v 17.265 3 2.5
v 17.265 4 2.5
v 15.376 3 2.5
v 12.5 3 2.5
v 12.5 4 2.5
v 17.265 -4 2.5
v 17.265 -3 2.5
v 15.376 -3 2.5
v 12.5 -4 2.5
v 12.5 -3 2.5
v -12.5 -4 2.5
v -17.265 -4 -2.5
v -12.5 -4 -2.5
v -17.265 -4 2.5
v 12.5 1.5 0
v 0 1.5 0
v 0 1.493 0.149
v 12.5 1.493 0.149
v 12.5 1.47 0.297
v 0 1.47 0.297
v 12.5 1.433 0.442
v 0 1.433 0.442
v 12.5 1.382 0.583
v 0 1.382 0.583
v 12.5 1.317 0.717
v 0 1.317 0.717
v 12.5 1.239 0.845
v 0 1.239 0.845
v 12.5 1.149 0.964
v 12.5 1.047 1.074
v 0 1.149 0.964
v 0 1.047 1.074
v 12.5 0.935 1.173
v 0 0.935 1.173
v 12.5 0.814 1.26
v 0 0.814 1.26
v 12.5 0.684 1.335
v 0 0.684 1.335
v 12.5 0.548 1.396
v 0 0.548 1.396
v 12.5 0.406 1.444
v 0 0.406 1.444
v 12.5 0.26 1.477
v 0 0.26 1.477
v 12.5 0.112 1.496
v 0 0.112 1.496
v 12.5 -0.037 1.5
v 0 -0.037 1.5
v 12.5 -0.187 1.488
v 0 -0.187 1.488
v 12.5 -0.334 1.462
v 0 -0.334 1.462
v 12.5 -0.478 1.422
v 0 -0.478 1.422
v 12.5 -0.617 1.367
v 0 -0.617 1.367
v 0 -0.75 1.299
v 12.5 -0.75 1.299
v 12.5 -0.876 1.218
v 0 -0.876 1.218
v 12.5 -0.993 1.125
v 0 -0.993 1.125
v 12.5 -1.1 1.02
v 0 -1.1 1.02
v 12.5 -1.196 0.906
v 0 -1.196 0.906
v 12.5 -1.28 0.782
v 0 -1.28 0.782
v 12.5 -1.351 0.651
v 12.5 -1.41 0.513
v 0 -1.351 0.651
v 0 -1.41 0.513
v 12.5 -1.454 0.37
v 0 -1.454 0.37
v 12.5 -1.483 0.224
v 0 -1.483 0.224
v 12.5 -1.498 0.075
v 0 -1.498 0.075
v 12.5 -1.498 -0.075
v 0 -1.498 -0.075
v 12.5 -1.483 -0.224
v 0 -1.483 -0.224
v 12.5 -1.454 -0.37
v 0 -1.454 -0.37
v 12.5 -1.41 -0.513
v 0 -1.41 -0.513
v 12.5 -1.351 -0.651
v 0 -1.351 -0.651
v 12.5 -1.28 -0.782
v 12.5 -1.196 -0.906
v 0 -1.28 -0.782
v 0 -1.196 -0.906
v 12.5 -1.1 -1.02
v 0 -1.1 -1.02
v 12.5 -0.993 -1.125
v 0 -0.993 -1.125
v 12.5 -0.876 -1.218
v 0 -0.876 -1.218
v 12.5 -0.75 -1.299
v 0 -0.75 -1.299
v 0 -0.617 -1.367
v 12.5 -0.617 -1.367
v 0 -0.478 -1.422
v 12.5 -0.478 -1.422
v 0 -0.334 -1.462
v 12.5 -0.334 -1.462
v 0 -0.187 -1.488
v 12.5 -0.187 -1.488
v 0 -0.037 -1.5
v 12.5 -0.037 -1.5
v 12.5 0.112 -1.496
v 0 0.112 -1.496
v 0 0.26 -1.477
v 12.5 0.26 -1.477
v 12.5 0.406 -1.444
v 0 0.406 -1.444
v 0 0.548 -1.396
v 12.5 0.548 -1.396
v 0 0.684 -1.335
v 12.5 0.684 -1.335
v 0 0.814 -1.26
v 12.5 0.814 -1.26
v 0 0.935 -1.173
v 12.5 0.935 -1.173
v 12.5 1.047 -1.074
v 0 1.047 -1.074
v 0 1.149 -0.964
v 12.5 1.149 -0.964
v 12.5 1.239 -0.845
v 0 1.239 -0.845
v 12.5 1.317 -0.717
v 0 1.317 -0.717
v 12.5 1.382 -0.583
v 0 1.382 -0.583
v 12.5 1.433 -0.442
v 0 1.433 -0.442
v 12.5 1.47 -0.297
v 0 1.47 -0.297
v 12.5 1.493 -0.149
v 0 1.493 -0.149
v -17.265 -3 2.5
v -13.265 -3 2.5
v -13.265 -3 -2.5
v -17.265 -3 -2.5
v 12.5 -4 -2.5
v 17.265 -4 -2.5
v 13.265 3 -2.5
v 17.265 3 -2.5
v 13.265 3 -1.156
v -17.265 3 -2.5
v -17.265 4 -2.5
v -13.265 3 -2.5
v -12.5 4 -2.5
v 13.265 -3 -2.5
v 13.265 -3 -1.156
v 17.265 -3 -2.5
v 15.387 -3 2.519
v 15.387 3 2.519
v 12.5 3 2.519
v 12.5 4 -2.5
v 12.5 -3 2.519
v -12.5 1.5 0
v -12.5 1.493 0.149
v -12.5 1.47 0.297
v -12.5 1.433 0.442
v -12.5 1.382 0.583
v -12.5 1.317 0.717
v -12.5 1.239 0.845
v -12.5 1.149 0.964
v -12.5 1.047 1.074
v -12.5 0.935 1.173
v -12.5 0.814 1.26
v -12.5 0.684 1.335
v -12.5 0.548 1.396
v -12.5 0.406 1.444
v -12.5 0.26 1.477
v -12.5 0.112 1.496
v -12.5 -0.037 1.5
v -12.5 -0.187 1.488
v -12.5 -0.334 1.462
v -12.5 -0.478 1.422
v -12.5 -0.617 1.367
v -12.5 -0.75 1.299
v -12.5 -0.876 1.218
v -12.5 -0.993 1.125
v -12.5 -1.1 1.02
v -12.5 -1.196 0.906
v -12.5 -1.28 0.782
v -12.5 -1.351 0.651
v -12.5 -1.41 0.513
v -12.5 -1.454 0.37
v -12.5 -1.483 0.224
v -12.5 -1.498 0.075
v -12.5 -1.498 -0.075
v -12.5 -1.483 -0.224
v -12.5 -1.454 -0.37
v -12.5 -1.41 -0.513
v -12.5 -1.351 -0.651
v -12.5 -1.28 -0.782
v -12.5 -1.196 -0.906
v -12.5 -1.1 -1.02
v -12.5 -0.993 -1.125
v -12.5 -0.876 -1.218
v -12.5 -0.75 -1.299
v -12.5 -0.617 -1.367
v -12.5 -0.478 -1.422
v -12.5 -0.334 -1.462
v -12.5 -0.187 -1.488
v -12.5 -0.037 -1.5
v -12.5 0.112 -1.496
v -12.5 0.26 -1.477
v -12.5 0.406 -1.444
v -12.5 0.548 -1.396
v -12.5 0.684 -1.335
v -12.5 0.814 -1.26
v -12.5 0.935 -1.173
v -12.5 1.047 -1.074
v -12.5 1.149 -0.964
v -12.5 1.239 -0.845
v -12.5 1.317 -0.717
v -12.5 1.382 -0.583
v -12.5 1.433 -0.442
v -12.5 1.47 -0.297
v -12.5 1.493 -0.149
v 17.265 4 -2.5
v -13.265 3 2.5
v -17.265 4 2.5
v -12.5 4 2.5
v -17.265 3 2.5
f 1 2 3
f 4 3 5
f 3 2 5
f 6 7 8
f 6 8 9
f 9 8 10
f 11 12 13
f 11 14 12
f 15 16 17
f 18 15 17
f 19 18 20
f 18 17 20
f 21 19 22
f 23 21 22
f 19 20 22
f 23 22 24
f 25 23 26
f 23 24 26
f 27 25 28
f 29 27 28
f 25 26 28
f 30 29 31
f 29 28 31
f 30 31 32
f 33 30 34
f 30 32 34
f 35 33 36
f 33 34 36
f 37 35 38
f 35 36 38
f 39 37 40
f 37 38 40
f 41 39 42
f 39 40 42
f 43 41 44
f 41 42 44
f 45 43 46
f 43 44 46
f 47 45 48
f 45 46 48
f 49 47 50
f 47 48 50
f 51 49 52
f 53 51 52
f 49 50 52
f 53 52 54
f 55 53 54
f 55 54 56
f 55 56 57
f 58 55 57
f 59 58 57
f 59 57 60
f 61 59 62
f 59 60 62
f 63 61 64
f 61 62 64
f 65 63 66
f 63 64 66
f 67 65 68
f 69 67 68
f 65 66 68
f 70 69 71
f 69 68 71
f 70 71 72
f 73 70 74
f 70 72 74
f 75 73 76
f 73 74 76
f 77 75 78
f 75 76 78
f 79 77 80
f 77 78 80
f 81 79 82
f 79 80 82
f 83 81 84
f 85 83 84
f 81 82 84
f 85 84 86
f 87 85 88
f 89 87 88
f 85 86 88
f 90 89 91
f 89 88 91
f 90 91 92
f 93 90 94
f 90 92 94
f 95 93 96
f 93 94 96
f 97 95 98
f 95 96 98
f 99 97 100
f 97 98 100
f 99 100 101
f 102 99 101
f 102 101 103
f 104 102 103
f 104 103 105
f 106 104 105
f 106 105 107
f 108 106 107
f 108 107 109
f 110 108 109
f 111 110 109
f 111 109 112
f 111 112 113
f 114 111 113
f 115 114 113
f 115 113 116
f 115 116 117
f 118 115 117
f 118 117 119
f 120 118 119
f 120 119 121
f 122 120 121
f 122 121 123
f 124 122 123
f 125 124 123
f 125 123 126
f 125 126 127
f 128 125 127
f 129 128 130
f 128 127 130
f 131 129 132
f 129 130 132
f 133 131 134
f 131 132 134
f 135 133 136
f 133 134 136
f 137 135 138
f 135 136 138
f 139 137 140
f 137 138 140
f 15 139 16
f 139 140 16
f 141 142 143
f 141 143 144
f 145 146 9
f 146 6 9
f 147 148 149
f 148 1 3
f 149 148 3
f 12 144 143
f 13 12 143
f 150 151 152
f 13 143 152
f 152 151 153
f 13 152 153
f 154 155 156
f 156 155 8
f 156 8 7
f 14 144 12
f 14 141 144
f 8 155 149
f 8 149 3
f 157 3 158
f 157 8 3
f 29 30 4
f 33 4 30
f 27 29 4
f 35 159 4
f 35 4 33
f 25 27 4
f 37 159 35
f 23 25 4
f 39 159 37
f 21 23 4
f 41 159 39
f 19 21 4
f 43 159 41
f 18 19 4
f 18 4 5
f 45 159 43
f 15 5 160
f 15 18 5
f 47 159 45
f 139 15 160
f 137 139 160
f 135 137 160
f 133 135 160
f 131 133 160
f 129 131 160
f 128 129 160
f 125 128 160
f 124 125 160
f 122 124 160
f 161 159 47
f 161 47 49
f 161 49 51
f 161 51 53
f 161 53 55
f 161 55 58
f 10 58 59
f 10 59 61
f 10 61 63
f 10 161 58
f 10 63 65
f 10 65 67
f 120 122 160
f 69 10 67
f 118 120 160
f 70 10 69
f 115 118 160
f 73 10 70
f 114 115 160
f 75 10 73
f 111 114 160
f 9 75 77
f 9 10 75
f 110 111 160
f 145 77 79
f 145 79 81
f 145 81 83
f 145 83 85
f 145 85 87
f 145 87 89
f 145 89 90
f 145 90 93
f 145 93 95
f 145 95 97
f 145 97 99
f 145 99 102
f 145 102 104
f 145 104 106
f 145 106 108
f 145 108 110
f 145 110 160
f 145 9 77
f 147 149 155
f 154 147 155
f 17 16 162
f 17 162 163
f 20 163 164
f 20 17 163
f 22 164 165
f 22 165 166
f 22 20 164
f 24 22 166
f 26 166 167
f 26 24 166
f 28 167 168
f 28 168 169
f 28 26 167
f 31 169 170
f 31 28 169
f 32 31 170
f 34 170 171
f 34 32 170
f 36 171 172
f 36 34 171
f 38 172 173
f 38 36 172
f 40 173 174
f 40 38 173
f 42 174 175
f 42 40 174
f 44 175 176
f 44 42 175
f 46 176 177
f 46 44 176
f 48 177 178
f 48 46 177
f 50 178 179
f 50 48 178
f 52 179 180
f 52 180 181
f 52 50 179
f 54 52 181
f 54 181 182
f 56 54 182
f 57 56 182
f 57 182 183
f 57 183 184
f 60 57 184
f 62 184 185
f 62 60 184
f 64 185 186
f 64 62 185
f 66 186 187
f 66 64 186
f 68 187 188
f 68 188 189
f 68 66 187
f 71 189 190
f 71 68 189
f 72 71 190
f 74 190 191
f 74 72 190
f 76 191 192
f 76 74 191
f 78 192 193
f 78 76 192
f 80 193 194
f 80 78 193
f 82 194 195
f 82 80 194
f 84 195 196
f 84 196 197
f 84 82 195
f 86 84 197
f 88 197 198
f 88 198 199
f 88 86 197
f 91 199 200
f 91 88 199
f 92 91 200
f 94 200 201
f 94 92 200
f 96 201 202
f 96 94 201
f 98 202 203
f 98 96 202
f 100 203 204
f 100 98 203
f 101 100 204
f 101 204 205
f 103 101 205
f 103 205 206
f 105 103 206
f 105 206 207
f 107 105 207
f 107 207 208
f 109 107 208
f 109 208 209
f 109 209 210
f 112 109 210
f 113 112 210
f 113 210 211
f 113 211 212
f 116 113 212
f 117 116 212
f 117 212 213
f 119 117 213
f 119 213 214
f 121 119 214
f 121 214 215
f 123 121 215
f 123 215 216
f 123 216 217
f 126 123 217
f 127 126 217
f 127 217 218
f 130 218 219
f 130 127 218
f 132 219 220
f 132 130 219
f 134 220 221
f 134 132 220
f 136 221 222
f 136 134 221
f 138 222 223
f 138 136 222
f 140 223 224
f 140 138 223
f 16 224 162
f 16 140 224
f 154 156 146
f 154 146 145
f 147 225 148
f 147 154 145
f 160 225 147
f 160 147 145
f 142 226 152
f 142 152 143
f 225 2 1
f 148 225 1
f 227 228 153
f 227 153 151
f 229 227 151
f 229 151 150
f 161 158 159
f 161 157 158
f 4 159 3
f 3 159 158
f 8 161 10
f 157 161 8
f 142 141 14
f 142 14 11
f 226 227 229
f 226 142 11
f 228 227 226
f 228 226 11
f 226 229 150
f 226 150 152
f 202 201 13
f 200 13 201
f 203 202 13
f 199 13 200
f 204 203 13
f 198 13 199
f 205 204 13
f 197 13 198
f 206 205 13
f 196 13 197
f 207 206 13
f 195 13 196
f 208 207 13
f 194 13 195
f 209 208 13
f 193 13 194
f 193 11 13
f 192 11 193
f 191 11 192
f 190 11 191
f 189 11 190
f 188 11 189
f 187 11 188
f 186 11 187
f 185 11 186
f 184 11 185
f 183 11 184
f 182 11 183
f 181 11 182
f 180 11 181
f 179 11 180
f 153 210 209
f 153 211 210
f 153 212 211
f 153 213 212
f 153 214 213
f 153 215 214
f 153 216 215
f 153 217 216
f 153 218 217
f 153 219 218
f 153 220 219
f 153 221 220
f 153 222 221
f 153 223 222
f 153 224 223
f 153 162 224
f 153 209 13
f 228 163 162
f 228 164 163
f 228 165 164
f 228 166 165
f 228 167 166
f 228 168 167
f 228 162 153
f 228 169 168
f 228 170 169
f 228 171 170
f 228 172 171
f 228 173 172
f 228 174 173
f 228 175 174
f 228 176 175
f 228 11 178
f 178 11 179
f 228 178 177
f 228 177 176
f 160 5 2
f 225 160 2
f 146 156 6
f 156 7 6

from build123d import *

# Parameters (mm, degrees)
F0_R     = 1.5
F1_DEPTH = 12.5
F3_DEPTH = 2.5
F6_DEPTH = 3


with BuildPart() as f1:
    # F0 (on Right) → F1 (new body)
    with BuildSketch(Plane.YZ):
        Circle(F0_R)
    extrude(amount=-F1_DEPTH)

    # F2 (on Top) → F3 (join, symmetric)
    with BuildSketch(Plane.XY):
        Polygon((-12.5, -4), (-12.5, 4), (-17.26534, 4), (-17.26534, 3), (-13.26534, 3), (-13.26534, -3), (-17.26534, -3), (-17.26534, -4), align=None)
    extrude(amount=F3_DEPTH, both=True)

    # F4: F1 across plane


with BuildPart() as f1_1:
    add(f1.part)
    add(f1.part.mirror(Plane.YZ))

    # F5 (on Front) → F6 (join, symmetric)
    with BuildSketch(Plane.XZ):
        Polygon((15.386751, 2.518649), (12.5, 2.518649), (12.5, -2.481351), align=None)
    extrude(amount=F6_DEPTH, both=True)


solid = f1_1.part
